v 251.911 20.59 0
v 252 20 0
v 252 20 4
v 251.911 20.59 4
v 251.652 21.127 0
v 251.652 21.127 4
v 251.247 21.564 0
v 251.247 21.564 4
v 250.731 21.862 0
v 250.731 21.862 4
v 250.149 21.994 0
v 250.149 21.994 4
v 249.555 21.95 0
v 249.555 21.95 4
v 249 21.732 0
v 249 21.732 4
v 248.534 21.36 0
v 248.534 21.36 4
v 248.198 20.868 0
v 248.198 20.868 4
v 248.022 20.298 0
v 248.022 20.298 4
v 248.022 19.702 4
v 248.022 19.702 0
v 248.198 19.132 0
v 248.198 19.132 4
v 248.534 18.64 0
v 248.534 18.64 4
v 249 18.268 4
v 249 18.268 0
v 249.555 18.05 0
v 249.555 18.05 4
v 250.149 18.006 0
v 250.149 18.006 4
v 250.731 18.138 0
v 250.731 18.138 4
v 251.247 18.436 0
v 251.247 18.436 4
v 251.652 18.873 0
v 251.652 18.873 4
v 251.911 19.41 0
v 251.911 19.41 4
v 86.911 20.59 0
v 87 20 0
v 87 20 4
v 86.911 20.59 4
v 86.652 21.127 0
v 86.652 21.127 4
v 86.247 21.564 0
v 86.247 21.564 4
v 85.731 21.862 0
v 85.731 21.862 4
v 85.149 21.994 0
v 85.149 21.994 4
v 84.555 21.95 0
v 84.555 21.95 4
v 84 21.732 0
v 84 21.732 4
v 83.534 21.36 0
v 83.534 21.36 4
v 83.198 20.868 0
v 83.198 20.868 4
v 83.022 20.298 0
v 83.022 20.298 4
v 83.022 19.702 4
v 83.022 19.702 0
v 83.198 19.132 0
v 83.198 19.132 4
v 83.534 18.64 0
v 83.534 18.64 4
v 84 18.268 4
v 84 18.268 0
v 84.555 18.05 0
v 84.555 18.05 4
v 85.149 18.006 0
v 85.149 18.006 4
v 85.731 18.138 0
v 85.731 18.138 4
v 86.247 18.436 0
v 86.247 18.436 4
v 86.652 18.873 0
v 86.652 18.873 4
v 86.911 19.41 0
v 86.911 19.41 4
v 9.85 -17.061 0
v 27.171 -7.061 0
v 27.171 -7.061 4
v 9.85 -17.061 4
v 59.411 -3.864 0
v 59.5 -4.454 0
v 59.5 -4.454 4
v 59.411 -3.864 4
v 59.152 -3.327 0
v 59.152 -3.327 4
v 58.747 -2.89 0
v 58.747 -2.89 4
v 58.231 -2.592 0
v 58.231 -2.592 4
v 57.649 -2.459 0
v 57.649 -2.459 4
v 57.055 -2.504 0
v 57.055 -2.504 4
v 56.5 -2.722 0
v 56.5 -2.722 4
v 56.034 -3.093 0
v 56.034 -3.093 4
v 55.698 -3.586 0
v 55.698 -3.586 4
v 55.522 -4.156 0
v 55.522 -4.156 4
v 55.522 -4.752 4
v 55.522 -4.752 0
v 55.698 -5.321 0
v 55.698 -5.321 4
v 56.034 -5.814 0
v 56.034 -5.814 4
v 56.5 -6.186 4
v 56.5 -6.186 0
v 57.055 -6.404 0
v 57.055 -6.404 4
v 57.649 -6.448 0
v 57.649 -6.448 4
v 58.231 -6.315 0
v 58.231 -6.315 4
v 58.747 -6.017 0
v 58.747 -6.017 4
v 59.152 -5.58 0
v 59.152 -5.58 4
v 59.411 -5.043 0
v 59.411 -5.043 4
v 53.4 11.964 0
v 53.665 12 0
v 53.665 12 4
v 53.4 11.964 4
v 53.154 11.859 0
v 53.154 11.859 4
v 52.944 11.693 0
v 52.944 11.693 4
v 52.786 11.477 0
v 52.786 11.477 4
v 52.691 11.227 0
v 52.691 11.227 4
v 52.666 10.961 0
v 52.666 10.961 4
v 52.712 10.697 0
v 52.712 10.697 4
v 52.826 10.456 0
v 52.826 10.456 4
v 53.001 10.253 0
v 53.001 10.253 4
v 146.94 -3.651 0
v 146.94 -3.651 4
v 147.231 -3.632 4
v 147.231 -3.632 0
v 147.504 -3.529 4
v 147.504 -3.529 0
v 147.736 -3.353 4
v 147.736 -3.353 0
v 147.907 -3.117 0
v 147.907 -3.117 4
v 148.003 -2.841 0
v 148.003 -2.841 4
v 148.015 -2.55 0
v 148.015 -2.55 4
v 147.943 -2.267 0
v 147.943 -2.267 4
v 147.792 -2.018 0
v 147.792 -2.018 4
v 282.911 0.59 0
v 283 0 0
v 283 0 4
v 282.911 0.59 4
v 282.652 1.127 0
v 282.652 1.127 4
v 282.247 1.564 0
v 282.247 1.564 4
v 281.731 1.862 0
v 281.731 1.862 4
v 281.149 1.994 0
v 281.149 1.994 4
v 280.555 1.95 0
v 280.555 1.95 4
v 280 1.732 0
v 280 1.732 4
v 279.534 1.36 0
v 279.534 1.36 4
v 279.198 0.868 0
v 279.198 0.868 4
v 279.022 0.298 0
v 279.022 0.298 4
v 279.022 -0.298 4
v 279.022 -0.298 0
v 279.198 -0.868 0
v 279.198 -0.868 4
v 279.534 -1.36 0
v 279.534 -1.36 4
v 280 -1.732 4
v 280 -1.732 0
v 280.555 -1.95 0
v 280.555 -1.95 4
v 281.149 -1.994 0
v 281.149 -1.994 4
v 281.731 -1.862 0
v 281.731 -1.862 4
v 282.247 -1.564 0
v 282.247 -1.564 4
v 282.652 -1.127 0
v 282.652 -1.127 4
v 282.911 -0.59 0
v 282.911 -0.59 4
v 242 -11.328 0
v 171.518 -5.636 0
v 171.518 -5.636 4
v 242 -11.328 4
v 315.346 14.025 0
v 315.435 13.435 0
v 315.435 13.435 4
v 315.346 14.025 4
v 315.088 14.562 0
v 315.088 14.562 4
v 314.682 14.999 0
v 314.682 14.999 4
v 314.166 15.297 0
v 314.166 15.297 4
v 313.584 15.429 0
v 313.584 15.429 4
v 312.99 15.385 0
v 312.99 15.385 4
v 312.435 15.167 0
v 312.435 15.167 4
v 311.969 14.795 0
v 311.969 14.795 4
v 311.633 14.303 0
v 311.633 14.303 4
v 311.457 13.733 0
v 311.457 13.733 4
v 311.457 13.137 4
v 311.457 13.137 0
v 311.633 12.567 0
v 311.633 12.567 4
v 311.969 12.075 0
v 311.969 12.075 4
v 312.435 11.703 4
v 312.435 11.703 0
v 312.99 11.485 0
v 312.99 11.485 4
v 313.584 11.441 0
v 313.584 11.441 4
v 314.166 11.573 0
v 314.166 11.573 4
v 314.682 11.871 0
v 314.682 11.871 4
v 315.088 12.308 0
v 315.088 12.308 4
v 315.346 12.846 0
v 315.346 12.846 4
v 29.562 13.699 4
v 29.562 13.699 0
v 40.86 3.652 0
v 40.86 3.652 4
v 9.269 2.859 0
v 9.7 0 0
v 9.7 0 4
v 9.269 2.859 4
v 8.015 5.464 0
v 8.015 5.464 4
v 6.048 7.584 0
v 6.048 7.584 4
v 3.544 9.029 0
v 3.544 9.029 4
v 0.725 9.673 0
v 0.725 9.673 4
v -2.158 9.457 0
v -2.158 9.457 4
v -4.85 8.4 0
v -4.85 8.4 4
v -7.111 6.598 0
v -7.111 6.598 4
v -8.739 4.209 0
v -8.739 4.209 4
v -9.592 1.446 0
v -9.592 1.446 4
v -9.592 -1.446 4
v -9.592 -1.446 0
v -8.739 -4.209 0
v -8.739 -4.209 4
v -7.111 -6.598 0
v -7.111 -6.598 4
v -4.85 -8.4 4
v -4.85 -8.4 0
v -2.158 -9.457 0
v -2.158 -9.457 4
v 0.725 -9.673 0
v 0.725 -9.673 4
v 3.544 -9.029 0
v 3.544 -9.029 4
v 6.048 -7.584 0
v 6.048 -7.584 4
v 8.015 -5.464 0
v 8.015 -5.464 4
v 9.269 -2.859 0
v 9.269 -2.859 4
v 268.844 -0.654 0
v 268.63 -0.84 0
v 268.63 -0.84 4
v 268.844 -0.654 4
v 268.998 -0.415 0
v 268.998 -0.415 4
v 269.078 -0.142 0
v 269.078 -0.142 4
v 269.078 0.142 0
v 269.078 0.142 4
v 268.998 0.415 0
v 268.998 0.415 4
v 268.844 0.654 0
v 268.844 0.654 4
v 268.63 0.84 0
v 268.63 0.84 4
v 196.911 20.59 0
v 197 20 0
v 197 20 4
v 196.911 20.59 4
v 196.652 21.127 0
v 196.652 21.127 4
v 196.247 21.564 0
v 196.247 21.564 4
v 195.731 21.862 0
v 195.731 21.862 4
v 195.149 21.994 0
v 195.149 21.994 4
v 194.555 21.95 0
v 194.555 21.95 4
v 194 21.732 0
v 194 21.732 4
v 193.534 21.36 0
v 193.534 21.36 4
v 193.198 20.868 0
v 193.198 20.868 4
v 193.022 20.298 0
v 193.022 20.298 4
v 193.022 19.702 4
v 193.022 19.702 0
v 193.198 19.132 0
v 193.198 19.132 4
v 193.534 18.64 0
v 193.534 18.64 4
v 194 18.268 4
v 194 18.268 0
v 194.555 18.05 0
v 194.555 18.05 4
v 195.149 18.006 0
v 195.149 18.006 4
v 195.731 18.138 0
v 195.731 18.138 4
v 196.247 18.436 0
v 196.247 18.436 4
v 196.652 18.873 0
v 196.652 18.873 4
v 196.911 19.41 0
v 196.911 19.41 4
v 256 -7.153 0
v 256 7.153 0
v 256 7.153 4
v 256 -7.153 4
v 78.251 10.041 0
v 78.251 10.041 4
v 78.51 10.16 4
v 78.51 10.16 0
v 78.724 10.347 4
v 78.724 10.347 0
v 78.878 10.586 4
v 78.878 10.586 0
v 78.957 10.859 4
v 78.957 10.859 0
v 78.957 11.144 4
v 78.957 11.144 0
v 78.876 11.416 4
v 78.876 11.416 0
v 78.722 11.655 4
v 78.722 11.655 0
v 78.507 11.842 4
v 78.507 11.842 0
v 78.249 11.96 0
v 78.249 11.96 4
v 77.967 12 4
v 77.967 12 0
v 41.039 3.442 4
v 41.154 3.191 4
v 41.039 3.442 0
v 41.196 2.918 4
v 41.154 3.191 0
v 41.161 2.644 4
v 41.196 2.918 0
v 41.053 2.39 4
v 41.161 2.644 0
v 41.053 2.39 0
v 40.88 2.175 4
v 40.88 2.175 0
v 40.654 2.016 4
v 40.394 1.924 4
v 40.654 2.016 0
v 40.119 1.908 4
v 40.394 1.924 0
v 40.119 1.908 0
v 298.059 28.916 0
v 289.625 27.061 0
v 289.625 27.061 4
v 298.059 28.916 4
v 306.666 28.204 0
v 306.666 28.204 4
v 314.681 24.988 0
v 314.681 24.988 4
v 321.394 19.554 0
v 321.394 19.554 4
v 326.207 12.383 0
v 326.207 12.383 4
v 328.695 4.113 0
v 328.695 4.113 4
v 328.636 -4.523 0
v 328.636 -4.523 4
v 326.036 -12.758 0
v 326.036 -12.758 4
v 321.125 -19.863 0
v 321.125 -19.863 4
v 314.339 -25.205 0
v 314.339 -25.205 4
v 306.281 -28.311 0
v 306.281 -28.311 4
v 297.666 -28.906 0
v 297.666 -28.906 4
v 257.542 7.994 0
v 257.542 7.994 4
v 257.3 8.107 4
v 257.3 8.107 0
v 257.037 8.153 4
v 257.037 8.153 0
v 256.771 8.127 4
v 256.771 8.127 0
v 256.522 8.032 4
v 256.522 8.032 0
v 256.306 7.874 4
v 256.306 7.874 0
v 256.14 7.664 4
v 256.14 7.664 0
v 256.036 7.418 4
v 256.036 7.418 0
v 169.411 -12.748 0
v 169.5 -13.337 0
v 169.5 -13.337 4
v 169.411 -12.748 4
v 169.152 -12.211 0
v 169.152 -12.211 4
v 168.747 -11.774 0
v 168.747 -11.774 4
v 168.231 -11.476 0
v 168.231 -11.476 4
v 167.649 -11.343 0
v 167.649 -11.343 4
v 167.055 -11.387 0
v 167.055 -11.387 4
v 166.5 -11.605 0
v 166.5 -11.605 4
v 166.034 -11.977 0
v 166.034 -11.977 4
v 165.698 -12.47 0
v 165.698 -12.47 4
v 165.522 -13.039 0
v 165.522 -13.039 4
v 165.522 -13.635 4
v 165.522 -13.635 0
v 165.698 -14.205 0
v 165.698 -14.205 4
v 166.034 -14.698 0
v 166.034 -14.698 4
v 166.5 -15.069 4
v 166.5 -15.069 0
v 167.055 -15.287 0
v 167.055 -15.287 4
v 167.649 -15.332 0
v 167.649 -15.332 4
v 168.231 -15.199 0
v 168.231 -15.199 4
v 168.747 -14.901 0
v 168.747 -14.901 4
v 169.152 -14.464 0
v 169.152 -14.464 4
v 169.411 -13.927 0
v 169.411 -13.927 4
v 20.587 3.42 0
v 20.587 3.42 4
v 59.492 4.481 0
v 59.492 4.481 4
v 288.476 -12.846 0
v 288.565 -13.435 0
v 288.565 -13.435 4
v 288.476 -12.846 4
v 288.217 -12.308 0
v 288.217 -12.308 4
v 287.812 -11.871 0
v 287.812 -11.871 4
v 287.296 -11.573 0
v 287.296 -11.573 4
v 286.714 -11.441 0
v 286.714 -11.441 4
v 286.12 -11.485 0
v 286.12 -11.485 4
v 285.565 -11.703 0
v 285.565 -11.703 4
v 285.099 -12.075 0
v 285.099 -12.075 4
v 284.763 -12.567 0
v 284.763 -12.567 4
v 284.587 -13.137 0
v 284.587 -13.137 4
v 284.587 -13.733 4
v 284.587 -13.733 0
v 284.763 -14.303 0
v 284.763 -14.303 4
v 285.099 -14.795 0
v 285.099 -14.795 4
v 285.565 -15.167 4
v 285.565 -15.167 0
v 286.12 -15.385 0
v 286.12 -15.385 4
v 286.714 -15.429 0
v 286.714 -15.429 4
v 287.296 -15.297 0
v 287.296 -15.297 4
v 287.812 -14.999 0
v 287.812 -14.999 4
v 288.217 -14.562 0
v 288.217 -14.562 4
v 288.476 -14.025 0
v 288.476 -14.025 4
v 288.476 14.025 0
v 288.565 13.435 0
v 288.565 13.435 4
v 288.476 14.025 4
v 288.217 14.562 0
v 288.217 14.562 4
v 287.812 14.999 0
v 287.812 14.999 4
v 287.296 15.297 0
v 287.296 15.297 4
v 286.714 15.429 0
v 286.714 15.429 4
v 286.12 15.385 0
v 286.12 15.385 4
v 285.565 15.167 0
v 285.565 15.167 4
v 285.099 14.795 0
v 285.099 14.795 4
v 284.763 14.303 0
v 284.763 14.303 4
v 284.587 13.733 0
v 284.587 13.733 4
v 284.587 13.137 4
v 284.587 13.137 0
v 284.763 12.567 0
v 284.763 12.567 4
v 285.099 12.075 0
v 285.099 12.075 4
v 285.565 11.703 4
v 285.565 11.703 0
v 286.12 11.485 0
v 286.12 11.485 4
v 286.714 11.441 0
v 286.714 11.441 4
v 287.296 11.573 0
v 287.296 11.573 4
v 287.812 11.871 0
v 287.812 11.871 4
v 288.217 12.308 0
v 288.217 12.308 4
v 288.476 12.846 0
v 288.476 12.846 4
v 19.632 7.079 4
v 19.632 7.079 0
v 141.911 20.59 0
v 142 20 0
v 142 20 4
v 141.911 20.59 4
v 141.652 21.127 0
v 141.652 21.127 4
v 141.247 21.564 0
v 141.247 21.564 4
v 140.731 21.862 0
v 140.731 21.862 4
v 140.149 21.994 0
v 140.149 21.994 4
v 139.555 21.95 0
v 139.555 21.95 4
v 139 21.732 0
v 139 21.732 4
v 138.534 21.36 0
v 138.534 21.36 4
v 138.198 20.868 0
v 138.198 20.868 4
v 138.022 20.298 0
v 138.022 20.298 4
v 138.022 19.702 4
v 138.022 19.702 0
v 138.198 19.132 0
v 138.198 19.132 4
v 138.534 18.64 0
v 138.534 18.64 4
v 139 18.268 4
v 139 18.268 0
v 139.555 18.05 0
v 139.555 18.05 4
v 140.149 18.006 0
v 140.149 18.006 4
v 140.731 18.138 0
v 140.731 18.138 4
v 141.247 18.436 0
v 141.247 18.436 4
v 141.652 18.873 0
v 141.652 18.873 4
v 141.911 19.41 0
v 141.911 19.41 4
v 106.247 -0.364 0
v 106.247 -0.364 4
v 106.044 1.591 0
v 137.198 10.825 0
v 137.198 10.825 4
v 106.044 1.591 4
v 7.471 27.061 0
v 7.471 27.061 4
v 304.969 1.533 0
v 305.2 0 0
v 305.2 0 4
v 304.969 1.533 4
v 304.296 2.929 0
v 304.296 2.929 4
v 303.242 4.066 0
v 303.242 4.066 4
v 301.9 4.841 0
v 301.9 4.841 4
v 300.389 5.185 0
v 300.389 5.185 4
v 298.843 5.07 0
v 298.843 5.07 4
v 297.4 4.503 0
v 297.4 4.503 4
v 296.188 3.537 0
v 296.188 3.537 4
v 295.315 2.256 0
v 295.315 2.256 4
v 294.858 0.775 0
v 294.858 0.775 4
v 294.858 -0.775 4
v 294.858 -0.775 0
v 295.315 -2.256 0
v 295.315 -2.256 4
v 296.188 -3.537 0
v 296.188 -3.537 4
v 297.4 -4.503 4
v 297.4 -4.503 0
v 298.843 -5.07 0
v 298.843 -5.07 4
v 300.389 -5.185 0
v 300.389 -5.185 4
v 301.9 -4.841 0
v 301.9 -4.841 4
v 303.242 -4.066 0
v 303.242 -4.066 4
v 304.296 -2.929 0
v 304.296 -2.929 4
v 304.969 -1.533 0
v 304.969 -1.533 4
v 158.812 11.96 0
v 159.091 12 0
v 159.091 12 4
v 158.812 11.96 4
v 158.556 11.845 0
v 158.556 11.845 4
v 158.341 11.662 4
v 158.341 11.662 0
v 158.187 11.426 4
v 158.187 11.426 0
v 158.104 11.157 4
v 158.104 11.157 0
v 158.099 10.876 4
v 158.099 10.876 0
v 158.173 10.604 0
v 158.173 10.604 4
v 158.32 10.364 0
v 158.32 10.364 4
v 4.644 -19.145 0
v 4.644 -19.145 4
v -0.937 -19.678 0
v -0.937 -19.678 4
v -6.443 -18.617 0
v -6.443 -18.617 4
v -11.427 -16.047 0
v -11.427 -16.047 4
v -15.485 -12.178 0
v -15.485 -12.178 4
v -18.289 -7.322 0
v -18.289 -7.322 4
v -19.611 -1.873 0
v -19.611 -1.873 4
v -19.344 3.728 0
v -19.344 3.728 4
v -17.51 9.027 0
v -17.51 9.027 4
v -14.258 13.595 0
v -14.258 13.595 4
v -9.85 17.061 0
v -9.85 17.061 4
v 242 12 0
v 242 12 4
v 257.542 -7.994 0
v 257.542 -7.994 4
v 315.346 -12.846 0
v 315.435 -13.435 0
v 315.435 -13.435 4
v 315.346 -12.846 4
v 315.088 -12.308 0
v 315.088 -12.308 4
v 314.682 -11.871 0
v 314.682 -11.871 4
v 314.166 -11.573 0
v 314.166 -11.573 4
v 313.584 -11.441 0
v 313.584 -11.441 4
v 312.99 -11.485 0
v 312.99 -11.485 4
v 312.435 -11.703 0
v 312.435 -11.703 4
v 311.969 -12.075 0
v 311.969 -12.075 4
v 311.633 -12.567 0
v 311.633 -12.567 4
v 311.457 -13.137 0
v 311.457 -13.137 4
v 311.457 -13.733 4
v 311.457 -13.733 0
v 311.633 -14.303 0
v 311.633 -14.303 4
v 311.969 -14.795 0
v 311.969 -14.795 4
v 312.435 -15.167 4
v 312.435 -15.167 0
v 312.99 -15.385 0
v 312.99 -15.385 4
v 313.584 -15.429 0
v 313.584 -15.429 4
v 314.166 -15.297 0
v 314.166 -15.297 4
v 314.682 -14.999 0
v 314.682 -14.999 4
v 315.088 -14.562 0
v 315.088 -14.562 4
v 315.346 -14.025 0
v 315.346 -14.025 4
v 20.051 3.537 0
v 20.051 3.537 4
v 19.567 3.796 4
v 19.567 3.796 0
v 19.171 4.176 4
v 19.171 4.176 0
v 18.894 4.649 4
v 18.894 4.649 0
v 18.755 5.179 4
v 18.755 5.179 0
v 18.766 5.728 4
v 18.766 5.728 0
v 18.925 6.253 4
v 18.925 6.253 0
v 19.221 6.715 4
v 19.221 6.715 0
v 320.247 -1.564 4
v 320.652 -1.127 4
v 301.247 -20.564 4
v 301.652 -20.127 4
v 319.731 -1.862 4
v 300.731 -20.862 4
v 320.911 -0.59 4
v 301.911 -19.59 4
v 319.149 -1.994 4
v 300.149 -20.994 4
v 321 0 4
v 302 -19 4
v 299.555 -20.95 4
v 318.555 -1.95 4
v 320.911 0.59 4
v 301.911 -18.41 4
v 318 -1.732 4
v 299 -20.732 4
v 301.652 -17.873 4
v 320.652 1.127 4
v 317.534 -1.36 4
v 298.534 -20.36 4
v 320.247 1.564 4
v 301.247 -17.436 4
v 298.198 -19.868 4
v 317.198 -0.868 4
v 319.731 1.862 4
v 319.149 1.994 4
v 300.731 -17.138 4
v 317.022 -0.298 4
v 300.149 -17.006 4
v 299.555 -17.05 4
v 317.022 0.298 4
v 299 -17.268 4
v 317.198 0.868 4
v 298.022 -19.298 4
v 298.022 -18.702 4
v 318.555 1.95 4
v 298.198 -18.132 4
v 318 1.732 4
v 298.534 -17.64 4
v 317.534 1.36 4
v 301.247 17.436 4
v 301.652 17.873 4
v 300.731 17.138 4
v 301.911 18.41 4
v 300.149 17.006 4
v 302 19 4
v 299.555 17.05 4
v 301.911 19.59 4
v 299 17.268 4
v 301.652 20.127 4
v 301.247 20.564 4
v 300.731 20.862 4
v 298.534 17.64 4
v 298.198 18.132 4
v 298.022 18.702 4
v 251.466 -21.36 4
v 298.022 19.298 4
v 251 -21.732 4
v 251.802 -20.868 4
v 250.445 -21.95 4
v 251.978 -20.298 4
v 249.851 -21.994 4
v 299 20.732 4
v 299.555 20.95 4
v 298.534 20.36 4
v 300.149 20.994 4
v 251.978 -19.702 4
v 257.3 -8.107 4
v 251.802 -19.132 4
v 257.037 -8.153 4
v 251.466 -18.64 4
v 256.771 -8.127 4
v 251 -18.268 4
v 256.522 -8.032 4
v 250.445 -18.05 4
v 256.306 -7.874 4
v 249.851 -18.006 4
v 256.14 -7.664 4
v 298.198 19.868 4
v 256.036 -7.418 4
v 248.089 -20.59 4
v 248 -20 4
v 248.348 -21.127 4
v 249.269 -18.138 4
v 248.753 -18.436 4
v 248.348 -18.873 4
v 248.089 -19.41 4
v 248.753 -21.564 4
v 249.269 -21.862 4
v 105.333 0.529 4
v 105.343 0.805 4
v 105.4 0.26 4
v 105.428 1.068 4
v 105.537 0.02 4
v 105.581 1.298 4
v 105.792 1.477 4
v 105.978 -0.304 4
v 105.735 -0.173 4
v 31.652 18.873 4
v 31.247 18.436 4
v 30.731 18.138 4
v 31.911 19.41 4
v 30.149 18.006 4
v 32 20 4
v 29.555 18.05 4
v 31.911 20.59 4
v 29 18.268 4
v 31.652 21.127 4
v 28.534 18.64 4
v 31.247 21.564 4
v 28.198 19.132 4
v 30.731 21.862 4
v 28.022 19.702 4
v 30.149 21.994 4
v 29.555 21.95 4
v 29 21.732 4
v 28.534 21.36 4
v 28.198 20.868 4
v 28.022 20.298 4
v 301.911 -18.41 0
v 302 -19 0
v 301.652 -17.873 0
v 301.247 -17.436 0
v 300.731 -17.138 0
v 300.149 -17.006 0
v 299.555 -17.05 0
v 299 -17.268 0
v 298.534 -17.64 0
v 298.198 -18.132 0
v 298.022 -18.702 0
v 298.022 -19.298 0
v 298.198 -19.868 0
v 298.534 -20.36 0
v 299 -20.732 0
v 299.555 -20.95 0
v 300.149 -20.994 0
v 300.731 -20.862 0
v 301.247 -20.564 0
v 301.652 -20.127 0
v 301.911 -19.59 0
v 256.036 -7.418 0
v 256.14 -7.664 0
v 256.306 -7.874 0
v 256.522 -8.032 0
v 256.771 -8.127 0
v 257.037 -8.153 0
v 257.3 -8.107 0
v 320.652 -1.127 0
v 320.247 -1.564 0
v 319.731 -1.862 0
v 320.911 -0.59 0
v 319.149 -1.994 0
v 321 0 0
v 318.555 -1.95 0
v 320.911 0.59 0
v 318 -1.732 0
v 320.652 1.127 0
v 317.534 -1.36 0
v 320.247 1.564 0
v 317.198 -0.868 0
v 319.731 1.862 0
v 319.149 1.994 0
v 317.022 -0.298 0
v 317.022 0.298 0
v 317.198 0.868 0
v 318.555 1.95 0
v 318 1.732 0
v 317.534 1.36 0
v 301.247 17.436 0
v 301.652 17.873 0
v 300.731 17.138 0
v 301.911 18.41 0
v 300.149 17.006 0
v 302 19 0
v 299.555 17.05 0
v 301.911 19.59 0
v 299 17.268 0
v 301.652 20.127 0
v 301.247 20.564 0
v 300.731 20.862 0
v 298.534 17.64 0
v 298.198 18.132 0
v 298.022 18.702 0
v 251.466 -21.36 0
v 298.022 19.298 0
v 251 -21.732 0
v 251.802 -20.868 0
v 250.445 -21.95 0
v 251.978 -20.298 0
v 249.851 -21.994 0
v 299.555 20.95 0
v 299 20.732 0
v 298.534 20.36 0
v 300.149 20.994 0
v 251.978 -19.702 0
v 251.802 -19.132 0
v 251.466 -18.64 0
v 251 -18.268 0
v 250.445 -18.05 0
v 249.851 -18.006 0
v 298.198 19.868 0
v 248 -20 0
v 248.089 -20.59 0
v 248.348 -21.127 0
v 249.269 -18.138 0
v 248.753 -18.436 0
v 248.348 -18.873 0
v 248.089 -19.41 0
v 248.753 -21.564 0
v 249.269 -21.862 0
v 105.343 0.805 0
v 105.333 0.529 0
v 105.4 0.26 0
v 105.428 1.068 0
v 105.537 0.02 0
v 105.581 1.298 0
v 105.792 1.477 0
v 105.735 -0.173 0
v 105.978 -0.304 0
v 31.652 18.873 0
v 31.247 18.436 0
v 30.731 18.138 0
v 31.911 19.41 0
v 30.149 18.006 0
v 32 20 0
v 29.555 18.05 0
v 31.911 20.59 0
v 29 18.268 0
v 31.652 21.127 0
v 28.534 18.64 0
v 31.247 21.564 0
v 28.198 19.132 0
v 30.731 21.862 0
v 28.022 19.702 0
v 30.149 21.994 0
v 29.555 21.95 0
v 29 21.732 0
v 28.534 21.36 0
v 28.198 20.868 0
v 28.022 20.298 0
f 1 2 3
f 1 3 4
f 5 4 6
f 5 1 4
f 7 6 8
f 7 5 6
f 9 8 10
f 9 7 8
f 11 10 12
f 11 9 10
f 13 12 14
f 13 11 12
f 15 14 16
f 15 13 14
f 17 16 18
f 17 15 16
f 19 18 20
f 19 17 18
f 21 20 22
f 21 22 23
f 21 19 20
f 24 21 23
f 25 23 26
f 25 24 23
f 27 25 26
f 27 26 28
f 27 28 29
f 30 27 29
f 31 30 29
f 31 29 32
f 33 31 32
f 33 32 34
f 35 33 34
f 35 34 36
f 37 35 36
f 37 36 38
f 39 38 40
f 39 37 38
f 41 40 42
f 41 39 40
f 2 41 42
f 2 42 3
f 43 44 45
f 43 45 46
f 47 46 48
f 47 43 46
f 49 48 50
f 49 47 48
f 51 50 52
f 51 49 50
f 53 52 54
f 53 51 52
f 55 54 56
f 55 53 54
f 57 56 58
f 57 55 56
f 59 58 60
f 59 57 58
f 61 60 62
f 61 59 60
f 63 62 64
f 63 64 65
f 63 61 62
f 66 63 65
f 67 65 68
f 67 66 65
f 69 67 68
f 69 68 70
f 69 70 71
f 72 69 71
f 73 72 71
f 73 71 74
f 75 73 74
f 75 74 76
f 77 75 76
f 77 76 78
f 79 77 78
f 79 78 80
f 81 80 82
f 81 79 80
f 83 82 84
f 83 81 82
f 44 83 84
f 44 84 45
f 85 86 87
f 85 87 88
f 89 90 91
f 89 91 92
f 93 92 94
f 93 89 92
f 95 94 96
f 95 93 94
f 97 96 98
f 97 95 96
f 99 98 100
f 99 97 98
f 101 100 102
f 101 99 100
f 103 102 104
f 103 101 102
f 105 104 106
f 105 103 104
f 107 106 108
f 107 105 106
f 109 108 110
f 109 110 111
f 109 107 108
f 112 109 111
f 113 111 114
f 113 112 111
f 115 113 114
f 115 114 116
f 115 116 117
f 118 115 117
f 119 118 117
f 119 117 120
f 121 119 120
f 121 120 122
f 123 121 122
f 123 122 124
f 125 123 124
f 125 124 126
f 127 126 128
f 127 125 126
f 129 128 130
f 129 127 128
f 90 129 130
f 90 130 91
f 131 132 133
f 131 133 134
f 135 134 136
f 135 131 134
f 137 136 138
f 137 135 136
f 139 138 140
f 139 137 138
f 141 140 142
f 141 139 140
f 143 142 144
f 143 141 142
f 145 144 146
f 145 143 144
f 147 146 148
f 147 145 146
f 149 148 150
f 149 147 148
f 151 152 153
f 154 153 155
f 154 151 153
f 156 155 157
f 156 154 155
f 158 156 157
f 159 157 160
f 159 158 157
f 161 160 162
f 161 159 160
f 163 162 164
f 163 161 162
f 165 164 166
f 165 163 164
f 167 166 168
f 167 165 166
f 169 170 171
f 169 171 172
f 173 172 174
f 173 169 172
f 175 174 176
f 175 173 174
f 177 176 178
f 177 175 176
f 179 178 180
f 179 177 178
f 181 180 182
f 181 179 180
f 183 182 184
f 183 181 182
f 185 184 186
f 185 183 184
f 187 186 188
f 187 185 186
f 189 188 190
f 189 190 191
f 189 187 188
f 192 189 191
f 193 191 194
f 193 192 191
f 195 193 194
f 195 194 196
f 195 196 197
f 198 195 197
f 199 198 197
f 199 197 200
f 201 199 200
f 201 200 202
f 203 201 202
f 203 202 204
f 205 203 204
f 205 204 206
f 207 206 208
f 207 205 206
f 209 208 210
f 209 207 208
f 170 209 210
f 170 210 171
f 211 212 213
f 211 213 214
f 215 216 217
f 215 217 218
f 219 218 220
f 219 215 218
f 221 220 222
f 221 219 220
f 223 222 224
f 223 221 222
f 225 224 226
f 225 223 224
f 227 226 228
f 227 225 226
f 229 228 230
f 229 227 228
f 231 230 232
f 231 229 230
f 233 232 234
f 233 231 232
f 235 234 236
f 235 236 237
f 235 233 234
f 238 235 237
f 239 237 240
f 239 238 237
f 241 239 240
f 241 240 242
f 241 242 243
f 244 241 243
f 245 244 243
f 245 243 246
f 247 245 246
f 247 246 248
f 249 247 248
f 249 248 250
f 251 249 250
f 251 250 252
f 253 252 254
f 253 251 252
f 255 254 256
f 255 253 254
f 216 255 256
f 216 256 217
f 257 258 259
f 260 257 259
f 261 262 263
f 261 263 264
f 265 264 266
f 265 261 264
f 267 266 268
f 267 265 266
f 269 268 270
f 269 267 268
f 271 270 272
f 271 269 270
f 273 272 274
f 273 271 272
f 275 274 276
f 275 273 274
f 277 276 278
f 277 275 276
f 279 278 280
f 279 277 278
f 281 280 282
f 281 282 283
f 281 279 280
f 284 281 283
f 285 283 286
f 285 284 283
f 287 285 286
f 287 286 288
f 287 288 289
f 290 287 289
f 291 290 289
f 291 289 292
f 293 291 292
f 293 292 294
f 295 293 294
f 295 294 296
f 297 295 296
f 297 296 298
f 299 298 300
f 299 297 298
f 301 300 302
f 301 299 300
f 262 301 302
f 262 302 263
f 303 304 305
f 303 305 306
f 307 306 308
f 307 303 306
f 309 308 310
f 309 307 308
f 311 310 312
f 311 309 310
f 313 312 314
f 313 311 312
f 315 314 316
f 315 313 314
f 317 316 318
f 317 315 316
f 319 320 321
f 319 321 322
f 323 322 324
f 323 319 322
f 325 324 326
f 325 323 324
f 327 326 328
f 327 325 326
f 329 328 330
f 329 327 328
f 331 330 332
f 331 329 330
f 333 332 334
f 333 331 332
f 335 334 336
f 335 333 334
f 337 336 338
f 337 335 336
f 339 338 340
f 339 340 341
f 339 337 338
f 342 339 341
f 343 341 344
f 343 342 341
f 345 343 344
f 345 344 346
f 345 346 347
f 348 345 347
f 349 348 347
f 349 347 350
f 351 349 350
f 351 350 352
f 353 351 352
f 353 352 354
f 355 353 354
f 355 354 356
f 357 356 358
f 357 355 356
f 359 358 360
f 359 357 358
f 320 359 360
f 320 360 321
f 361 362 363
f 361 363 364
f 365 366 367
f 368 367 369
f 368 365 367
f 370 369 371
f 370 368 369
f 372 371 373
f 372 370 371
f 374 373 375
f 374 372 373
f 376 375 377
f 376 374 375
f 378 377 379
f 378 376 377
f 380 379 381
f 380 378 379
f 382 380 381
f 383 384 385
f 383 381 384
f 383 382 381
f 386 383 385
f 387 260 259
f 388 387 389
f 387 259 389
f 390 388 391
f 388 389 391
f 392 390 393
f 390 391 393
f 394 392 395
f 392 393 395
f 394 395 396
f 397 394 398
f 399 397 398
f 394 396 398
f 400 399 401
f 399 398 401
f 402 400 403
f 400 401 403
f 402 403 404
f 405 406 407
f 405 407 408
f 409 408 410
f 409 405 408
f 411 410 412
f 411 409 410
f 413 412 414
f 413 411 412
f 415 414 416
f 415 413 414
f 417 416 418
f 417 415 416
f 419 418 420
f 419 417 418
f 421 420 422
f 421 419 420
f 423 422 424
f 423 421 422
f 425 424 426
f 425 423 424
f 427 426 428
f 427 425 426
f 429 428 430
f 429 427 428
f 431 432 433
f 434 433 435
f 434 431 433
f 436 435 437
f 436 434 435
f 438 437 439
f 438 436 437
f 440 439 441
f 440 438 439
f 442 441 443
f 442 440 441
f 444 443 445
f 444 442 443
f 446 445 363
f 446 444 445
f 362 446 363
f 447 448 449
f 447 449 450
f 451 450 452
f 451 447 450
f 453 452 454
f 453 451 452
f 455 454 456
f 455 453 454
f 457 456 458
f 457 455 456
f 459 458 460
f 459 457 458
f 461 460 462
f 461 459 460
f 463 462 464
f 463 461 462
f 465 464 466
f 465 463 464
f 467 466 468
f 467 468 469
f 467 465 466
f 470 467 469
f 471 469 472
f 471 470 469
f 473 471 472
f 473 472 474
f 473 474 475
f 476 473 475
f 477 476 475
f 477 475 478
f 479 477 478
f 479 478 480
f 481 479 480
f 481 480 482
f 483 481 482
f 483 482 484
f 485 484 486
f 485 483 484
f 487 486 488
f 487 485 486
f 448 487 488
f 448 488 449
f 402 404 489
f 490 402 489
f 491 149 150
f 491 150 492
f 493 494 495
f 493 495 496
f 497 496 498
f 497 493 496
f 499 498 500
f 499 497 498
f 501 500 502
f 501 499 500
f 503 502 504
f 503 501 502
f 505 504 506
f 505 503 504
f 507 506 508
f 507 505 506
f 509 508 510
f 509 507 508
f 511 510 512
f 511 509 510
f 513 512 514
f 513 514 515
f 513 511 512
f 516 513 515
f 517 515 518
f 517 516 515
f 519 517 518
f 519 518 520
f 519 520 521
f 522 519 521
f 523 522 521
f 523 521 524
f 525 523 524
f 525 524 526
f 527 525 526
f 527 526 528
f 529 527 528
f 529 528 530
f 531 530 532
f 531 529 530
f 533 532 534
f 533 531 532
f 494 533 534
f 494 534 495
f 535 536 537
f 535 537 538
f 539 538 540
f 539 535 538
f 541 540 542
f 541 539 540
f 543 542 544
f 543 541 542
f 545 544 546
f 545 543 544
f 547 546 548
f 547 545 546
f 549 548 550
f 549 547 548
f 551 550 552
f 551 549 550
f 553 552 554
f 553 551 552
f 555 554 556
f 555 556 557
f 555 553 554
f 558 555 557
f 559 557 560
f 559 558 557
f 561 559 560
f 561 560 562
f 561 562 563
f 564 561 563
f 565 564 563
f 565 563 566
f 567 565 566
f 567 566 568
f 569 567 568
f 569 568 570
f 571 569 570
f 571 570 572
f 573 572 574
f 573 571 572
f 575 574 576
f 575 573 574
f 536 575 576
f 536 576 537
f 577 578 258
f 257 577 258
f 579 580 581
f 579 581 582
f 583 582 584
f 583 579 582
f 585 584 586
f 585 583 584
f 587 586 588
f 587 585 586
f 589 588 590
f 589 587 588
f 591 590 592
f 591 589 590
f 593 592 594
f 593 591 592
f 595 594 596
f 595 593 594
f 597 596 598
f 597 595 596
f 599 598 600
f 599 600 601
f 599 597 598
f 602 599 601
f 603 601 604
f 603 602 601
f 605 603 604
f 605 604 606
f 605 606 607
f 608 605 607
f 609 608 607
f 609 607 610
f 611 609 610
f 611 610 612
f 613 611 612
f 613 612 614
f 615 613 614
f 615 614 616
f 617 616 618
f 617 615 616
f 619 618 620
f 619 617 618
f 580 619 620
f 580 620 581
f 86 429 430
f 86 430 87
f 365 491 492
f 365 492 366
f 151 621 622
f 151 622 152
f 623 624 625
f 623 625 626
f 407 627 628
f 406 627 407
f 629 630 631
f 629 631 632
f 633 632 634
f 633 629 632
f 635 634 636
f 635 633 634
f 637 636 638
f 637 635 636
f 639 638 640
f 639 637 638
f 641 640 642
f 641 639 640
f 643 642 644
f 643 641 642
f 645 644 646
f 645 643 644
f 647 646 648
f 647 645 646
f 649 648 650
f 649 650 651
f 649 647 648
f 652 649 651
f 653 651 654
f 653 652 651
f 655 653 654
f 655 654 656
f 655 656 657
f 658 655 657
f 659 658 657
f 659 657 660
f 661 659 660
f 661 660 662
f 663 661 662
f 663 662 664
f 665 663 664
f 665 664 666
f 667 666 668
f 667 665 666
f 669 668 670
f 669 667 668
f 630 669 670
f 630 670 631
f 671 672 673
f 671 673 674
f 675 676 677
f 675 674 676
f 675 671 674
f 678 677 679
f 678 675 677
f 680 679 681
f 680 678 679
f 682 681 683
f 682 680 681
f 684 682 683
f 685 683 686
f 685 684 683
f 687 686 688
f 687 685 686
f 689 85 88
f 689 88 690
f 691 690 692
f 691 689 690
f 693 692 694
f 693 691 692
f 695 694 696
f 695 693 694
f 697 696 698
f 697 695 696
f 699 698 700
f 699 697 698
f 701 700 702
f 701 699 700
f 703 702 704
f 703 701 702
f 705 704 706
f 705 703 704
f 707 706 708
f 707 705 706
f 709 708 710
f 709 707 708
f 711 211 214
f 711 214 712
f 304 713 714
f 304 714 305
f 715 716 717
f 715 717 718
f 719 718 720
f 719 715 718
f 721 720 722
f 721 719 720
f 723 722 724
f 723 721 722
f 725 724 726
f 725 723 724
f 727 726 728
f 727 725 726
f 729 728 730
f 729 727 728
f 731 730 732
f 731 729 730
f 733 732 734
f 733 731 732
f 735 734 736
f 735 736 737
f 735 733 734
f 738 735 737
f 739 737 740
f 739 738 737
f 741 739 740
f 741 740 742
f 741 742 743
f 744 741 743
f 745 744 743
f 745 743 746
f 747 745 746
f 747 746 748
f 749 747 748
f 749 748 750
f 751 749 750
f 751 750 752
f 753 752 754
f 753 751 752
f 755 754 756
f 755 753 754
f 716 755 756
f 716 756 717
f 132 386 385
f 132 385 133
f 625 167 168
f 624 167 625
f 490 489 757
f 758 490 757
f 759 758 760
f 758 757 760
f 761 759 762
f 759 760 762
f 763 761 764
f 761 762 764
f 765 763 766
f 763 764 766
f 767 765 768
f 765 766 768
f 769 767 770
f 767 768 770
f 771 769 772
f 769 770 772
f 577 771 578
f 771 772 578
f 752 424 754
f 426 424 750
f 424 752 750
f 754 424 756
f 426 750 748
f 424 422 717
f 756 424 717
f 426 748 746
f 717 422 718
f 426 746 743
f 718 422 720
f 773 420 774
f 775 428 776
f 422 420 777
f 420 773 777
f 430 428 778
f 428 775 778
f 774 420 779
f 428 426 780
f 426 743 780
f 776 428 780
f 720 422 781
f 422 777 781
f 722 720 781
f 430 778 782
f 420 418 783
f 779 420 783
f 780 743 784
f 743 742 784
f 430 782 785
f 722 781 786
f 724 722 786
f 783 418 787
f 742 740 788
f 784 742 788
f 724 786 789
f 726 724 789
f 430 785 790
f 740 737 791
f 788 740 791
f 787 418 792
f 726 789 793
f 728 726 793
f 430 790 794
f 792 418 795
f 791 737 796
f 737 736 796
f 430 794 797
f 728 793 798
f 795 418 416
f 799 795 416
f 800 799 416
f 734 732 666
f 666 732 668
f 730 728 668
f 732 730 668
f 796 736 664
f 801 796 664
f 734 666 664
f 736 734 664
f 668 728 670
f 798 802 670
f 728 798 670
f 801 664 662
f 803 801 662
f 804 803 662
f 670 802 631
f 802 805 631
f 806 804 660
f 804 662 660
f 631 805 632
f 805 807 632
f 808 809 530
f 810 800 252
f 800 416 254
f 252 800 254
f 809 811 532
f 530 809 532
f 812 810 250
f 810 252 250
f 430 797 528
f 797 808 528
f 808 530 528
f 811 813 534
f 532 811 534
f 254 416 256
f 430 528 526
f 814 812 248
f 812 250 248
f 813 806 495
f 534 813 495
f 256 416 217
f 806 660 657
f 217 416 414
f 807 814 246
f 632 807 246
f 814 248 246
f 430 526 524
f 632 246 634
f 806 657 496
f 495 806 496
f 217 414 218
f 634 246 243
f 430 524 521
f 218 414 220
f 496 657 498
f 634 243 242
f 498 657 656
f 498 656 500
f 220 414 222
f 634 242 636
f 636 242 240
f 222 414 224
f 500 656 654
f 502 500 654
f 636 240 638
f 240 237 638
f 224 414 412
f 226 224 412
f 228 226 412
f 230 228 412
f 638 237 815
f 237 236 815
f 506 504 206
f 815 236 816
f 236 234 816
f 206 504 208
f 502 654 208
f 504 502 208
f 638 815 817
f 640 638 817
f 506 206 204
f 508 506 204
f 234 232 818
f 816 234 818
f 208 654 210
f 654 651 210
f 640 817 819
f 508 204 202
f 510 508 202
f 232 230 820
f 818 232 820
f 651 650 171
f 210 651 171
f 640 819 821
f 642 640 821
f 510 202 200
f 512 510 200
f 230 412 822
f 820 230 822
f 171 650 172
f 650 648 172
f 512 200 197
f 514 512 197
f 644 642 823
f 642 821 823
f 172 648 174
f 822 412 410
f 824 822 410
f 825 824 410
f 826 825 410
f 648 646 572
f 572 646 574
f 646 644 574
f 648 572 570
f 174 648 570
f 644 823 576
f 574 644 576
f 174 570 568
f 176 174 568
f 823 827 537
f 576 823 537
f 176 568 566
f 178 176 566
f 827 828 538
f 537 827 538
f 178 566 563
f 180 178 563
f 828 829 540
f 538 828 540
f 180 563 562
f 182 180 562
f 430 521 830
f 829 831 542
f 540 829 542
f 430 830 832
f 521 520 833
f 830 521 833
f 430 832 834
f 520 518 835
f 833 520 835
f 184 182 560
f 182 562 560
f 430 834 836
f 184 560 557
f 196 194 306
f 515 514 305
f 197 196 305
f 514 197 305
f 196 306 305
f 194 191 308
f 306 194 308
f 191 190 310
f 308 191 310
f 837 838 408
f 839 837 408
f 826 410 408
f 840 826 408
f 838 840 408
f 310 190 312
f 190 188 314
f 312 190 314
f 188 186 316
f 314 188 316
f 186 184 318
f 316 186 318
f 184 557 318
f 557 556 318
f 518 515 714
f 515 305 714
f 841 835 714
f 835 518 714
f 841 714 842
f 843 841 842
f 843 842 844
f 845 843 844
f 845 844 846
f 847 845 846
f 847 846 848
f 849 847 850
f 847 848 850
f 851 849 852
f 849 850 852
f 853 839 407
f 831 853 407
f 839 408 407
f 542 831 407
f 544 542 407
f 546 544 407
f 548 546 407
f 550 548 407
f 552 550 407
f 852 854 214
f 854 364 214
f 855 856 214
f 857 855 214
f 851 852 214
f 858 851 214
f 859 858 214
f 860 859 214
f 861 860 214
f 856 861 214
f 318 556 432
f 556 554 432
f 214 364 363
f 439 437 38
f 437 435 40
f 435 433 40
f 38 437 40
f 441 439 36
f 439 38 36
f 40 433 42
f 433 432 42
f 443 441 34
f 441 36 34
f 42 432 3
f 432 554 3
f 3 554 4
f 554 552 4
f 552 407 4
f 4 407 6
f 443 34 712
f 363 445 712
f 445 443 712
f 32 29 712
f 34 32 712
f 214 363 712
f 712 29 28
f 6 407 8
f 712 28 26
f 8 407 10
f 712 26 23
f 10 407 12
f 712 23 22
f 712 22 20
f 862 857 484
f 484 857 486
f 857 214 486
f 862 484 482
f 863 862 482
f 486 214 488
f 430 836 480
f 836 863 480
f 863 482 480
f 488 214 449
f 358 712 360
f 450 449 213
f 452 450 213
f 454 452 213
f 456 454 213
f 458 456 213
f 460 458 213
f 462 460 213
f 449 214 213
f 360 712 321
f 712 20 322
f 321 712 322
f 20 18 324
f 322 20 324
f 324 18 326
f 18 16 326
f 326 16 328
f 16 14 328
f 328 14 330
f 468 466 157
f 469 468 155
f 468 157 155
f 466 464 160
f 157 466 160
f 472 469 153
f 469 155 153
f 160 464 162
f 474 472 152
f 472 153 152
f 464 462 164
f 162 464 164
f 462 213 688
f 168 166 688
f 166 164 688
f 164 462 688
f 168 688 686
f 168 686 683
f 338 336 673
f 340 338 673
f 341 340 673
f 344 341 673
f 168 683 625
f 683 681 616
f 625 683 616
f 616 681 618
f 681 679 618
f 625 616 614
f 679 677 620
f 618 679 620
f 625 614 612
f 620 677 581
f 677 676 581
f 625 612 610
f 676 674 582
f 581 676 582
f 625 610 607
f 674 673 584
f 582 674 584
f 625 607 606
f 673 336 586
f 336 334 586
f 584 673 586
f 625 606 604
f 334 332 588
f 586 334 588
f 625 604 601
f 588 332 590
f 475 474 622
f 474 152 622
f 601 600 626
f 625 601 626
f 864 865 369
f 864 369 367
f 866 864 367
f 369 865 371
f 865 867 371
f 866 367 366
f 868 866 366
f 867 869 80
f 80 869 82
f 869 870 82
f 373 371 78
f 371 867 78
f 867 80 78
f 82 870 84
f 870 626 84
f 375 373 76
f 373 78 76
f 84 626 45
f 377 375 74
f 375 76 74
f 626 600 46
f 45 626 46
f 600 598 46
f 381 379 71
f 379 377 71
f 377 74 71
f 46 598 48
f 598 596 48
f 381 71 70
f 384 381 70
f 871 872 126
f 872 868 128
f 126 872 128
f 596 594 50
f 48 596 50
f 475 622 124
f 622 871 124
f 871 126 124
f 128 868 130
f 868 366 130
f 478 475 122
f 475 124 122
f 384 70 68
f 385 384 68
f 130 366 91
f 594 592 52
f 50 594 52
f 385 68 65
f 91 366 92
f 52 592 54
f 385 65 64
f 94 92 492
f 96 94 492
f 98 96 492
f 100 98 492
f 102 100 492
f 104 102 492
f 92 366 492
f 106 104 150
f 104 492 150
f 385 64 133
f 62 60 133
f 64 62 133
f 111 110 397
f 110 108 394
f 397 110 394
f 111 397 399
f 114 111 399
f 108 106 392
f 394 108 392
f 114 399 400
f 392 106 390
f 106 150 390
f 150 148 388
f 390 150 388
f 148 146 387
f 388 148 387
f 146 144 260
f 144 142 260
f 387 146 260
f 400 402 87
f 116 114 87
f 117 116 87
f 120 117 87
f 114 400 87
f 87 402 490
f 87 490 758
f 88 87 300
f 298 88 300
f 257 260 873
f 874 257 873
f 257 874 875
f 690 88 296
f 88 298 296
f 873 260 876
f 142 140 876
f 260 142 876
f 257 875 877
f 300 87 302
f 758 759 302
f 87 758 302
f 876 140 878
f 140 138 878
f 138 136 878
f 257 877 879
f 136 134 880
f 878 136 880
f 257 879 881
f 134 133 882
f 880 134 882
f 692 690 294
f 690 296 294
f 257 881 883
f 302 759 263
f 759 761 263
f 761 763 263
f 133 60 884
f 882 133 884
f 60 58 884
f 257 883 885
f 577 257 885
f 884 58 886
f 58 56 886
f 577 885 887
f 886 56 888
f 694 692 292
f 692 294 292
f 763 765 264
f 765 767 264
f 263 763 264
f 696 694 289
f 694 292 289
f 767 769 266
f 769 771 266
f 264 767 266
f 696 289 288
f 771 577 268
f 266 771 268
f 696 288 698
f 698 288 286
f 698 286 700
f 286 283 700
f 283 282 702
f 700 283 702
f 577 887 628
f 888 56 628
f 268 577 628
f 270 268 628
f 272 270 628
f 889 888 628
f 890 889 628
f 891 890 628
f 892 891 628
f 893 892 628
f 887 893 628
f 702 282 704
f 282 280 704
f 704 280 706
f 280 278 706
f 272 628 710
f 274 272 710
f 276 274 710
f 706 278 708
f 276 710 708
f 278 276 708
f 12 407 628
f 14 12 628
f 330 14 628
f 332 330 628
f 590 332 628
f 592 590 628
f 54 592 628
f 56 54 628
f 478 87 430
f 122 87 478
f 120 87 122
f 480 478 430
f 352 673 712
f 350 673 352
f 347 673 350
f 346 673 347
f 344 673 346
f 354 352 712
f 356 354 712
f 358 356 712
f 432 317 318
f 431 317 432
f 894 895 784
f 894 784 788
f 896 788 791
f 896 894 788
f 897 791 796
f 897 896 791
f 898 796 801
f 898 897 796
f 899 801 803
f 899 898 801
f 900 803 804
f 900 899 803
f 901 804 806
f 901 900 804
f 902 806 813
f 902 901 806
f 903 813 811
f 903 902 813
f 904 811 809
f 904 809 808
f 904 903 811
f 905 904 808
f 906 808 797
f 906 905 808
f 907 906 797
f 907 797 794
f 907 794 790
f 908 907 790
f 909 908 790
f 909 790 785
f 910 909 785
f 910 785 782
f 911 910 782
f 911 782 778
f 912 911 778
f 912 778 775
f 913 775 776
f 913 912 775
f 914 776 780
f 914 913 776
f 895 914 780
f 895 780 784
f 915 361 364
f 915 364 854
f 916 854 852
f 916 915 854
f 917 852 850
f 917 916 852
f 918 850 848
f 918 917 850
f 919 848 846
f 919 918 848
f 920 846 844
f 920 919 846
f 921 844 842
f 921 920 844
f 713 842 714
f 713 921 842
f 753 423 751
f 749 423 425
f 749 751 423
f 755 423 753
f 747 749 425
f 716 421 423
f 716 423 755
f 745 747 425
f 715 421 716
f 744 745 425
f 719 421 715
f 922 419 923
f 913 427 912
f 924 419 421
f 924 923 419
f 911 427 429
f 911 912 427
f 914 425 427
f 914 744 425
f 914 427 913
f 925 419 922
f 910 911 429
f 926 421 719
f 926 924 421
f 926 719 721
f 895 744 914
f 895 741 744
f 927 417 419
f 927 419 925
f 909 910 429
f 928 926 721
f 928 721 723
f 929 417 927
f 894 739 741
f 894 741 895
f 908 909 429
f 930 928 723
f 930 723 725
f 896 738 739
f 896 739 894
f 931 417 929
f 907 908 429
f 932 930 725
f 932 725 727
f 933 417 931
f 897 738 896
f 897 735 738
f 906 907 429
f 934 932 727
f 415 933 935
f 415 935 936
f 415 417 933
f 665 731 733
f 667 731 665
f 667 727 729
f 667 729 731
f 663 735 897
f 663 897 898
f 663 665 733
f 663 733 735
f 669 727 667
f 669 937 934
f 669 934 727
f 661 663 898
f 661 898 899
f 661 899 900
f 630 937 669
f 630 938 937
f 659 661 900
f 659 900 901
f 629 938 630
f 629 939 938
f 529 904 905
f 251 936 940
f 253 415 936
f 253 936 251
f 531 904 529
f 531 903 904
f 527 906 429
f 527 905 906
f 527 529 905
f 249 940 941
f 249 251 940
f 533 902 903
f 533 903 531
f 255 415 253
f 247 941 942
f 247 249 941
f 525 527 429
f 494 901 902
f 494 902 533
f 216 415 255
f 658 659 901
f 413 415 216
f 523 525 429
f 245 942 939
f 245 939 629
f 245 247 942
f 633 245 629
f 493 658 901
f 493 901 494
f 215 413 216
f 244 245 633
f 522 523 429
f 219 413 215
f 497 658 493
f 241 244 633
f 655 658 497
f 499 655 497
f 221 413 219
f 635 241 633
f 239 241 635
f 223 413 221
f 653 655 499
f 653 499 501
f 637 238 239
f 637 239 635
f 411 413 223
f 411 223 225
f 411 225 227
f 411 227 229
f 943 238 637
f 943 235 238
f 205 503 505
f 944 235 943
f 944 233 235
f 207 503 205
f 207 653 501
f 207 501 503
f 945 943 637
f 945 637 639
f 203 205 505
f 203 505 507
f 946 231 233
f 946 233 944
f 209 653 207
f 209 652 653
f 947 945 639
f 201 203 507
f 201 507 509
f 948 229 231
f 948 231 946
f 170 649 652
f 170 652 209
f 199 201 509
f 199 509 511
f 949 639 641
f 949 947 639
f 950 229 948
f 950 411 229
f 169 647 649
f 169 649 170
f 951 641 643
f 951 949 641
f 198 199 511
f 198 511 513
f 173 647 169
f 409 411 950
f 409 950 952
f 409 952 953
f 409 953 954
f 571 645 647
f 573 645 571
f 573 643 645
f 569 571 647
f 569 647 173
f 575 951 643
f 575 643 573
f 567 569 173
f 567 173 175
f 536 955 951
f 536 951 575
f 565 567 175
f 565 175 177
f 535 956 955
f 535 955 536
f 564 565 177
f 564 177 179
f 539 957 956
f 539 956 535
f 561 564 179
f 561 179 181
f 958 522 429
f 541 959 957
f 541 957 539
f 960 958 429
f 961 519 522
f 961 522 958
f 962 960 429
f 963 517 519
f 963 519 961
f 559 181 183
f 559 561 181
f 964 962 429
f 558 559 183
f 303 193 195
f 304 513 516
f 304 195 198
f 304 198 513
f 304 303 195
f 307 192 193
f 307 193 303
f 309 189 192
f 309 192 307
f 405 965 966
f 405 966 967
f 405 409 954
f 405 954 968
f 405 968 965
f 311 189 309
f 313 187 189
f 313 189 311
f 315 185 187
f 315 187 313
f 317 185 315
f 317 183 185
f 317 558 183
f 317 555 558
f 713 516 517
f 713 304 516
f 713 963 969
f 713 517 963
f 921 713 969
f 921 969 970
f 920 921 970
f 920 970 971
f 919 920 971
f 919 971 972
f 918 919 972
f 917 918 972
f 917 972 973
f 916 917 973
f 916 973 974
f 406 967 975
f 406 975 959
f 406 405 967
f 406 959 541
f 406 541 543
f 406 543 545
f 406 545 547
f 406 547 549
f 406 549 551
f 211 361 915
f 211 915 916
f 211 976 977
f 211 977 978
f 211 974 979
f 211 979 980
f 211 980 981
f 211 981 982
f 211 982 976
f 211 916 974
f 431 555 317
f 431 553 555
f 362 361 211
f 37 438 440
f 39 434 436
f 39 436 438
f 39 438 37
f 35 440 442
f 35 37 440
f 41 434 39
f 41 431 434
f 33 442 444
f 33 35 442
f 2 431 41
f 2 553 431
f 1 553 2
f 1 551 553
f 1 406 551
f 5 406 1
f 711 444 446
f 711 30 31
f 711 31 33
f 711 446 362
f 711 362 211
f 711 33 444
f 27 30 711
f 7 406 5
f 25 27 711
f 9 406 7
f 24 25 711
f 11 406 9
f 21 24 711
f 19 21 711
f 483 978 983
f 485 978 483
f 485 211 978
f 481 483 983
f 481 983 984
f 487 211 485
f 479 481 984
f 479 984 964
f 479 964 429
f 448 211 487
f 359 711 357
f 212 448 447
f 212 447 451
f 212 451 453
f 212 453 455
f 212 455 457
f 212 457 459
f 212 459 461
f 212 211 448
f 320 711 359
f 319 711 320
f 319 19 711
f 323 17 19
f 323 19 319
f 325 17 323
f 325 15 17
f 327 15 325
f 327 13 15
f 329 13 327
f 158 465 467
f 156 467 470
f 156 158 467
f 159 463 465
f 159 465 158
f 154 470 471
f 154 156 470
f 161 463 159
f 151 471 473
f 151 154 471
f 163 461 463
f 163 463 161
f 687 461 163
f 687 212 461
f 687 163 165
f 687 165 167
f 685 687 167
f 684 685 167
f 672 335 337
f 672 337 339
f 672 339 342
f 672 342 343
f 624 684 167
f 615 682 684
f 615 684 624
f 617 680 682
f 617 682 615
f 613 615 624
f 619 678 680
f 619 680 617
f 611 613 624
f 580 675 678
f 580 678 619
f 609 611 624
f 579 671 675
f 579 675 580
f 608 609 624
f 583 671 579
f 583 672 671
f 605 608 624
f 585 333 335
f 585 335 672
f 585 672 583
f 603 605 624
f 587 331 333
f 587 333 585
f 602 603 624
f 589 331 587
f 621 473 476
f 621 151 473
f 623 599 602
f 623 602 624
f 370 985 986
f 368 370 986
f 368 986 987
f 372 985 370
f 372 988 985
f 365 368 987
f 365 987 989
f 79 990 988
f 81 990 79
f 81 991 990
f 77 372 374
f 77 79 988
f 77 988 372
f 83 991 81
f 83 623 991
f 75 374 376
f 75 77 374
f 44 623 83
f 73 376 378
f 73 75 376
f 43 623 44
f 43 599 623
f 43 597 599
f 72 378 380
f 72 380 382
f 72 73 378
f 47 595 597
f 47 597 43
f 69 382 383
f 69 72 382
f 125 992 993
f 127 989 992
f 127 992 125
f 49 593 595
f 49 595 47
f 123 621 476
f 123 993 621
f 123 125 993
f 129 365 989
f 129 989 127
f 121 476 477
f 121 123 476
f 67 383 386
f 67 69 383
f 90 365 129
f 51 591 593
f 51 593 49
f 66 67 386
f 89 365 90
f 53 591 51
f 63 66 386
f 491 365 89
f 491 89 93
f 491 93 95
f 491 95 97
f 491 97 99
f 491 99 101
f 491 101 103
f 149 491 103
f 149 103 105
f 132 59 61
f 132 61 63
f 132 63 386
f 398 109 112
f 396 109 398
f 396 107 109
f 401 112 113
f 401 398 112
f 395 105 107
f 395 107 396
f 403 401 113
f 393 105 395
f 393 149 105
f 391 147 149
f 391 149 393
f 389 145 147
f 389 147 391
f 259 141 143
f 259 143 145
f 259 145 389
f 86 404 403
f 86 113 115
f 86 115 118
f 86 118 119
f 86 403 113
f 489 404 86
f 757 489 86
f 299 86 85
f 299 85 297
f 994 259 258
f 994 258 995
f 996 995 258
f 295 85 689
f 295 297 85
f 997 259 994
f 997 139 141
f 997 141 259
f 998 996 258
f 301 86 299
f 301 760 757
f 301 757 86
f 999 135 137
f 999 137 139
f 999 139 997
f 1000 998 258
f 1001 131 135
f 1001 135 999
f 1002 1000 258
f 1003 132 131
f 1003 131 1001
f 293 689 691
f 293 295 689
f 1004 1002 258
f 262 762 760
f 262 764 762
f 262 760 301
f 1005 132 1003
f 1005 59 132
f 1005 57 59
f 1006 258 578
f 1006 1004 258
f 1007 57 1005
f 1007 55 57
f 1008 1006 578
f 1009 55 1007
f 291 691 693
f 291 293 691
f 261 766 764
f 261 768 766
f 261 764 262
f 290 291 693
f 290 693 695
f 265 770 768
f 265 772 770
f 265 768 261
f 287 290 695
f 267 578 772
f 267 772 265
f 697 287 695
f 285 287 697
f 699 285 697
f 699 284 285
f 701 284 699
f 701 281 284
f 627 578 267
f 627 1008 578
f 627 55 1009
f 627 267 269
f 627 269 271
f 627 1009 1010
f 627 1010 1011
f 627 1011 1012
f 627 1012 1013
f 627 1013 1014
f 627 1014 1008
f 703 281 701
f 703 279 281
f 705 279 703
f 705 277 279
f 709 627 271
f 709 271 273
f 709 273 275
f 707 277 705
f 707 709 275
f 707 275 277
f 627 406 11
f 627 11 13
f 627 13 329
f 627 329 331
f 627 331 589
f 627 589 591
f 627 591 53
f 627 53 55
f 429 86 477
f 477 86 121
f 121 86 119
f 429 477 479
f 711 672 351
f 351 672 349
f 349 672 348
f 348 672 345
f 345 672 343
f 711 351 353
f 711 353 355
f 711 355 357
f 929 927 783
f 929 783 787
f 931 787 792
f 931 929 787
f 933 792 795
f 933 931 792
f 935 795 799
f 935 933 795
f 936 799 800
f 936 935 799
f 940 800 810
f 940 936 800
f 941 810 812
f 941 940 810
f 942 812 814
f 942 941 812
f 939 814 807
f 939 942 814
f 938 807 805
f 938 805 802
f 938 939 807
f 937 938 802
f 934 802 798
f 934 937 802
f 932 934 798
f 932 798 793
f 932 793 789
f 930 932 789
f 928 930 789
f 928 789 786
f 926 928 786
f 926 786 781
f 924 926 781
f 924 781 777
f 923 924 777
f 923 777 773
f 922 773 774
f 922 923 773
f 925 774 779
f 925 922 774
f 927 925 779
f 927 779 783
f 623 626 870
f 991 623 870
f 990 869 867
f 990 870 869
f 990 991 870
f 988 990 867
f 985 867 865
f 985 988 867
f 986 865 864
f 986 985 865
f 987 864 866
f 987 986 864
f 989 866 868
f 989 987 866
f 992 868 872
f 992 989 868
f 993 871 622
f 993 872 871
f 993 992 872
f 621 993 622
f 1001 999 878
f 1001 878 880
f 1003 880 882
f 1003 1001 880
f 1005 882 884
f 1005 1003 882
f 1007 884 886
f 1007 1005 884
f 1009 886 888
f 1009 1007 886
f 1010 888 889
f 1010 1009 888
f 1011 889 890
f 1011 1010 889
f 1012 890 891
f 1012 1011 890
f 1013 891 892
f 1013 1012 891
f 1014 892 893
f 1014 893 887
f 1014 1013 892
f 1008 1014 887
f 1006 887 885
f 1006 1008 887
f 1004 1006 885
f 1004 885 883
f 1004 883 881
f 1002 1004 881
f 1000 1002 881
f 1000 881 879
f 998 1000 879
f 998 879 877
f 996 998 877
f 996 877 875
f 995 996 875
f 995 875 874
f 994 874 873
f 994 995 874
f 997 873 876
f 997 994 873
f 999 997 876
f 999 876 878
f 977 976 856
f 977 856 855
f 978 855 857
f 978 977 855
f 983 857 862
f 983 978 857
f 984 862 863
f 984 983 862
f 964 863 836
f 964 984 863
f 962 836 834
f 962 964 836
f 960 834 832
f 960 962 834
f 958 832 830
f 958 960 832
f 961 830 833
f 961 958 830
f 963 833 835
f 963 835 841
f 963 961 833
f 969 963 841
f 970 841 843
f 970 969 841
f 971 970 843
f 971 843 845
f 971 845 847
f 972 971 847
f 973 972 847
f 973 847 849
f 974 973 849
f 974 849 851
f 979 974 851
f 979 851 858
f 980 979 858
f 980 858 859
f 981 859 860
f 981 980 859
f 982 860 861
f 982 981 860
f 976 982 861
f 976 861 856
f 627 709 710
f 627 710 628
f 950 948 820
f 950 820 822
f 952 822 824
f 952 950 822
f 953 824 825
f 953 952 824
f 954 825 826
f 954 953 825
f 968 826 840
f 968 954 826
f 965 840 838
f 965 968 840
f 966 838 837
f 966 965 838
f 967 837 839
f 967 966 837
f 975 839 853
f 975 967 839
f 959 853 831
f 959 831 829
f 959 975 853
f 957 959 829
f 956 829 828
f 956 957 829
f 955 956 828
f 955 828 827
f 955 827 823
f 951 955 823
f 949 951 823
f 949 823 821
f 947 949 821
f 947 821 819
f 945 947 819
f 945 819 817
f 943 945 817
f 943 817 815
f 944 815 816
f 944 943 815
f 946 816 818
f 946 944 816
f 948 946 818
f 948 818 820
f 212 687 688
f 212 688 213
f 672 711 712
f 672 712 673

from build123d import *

# Parameters (mm, degrees)
SKETCH_1_R          = 9.7
SKETCH_1_R_2        = 5.2
SKETCH_1_R_3        = 2
EXTRUDE_1_DEPTH     = 4
CUT_EXTRUDE_1_DEPTH = 10


with BuildPart() as part:
    # 草图1 → 凸台-拉伸1 (new body)
    with BuildSketch(Plane.XY):
        with BuildLine():
            Line((-9.85, 17.060700455), (7.470508076, 27.060700455))
            Line((7.470508076, 27.060700455), (289.624667154, 27.060700455))
            ThreePointArc((289.624667154, 27.060700455), (328.694852344, 4.11311011), (297.66555963, -28.905888469))
            Line((297.66555963, -28.905888469), (27.170508076, -7.060700455))
            Line((27.170508076, -7.060700455), (9.85, -17.060700455))
            ThreePointArc((9.85, -17.060700455), (-17.060700455, -9.85), (-9.85, 17.060700455))
        make_face()
        Circle(SKETCH_1_R, mode=Mode.SUBTRACT)
        with Locations((300, 0)):
            Circle(SKETCH_1_R_2, mode=Mode.SUBTRACT)
        with Locations((319, 0)):
            Circle(SKETCH_1_R_3, mode=Mode.SUBTRACT)
        with Locations((313.435028843, -13.435028843)):
            Circle(SKETCH_1_R_3, mode=Mode.SUBTRACT)
        with Locations((300, -19)):
            Circle(SKETCH_1_R_3, mode=Mode.SUBTRACT)
        with Locations((286.564971157, -13.435028843)):
            Circle(SKETCH_1_R_3, mode=Mode.SUBTRACT)
        with Locations((281, 0)):
            Circle(SKETCH_1_R_3, mode=Mode.SUBTRACT)
        with Locations((286.564971157, 13.435028843)):
            Circle(SKETCH_1_R_3, mode=Mode.SUBTRACT)
        with Locations((300, 19)):
            Circle(SKETCH_1_R_3, mode=Mode.SUBTRACT)
        with Locations((313.435028843, 13.435028843)):
            Circle(SKETCH_1_R_3, mode=Mode.SUBTRACT)
        with Locations((250, 20)):
            Circle(SKETCH_1_R_3, mode=Mode.SUBTRACT)
        with Locations((195, 20)):
            Circle(SKETCH_1_R_3, mode=Mode.SUBTRACT)
        with Locations((140, 20)):
            Circle(SKETCH_1_R_3, mode=Mode.SUBTRACT)
        with Locations((85, 20)):
            Circle(SKETCH_1_R_3, mode=Mode.SUBTRACT)
        with Locations((30, 20)):
            Circle(SKETCH_1_R_3, mode=Mode.SUBTRACT)
        with Locations(Location((250, -20, 0), (0, 0, 180))):
            Circle(SKETCH_1_R_3, mode=Mode.SUBTRACT)
        with Locations((167.5, -13.337297667)):
            Circle(SKETCH_1_R_3, mode=Mode.SUBTRACT)
        with Locations((57.5, -4.453694555)):
            Circle(SKETCH_1_R_3, mode=Mode.SUBTRACT)
    extrude(amount=EXTRUDE_1_DEPTH)

    # 草图2 → 切除-拉伸1 (cut)
    with BuildSketch(Plane(origin=(0, 0, 0), x_dir=(-1, 0, 0), z_dir=(0, 0, -1))):
        with BuildLine():
            Line((-137.197603441, 10.82531174), (-106.043706264, 1.591034337))
            ThreePointArc((-106.043706264, 1.591034337), (-105.333274422, 0.528665045), (-106.247395472, -0.364489265))
            Line((-106.247395472, -0.364489265), (-146.939942745, -3.650820533))
            ThreePointArc((-146.939942745, -3.650820533), (-147.907056702, -3.116572023), (-147.791851116, -2.017727835))
            Line((-147.791851116, -2.017727835), (-137.197603441, 10.82531174))
        make_face()
        with BuildLine():
            Line((-242, 12), (-159.091058121, 12))
            ThreePointArc((-159.091058121, 12), (-158.186531194, 11.426416508), (-158.319647694, 10.363662077))
            Line((-158.319647694, 10.363662077), (-171.517559676, -5.635709572))
            Line((-171.517559676, -5.635709572), (-242, -11.327873446))
            Line((-242, -11.327873446), (-242, 12))
        make_face()
        with BuildLine():
            Line((-77.967218715, 12), (-53.665101582, 12))
            ThreePointArc((-53.665101582, 12), (-52.730413268, 11.355468359), (-53.000597339, 10.252715509))
            Line((-53.000597339, 10.252715509), (-59.49167188, 4.480688084))
            Line((-59.49167188, 4.480688084), (-78.251405867, 10.041231173))
            ThreePointArc((-78.251405867, 10.041231173), (-78.956857242, 11.14358129), (-77.967218715, 12))
        make_face()
        with BuildLine():
            Line((-268.630020148, 0.840296648), (-257.54212687, 7.993776182))
            ThreePointArc((-257.54212687, 7.993776182), (-256.52152684, 8.031581712), (-256, 7.153479534))
            Line((-256, 7.153479534), (-256, -7.153479534))
            ThreePointArc((-256, -7.153479534), (-256.52152684, -8.031581712), (-257.54212687, -7.993776182))
            Line((-257.54212687, -7.993776182), (-268.630020148, -0.840296648))
            ThreePointArc((-268.630020148, -0.840296648), (-269.087893278, 0), (-268.630020148, 0.840296648))
        make_face()
        with BuildLine():
            Line((-19.631707517, 7.078552885), (-29.56189752, 13.698679554))
            Line((-29.56189752, 13.698679554), (-40.860283753, 3.651869157))
            ThreePointArc((-40.860283753, 3.651869157), (-41.116034111, 2.513264507), (-40.118555254, 1.907570918))
            Line((-40.118555254, 1.907570918), (-20.586659398, 3.4204248))
            ThreePointArc((-20.586659398, 3.4204248), (-18.805958358, 4.909282805), (-19.631707517, 7.078552885))
        make_face()
    extrude(amount=-CUT_EXTRUDE_1_DEPTH, mode=Mode.SUBTRACT)


solid = part.part
